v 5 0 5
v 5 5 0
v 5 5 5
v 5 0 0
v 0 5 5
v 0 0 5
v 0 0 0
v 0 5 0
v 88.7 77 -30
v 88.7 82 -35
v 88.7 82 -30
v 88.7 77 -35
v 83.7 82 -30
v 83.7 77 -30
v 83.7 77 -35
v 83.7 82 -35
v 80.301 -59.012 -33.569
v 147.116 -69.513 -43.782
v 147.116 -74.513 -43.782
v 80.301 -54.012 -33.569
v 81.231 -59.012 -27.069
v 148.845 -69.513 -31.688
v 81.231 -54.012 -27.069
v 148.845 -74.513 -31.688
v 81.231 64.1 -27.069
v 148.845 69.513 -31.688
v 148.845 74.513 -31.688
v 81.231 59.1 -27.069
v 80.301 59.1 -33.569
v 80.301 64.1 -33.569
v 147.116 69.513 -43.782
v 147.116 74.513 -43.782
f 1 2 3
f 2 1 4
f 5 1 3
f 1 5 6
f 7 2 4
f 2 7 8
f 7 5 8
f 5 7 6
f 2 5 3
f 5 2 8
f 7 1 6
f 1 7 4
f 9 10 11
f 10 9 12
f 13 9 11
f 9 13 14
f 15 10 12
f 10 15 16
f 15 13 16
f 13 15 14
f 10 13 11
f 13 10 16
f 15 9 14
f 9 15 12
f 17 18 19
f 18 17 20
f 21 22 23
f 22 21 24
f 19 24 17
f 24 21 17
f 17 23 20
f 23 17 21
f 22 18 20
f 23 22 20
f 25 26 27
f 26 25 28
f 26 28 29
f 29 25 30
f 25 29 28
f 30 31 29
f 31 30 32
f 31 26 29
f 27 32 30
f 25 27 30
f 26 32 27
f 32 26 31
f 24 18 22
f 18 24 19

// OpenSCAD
union() {
    cube(5);
    translate([ 88.7-5, 87-10, -34-1]) cube(5);
    polyhedron( points = [ 
            [153.898,59.513,-32.4658] , 
            [163.267,30.683,-34.429] , 
            [175.611,59.513,-24.8805] , 
            [184.981,30.683,-26.8437] , 
            [166.57,-1.77636e-15,-35.1211] , 
            [188.284,-1.77636e-15,-27.5359] , 
            [163.267,-30.683,-34.429] , 
            [184.981,-30.683,-26.8437] , 
            [153.898,-59.513,-32.4658] , 
            [175.611,-59.513,-24.8805] , 
            [181.898,59.513,-27.7158] , 
            [191.267,30.683,-29.679] , 
            [194.57,-1.77636e-15,-30.3711] , 
            [191.267,-30.683,-29.679] , 
            [181.898,-59.513,-27.7158] , 
            [163.961,59.513,-33.9819] , 
            [173.33,30.683,-35.9451] , 
            [176.633,-1.77636e-15,-36.6372] , 
            [173.33,-30.683,-35.9451] , 
            [163.961,-59.513,-33.9819] , 
            [148.845,69.513,-31.6884] , 
            [148.845,-69.513,-31.6884] , 
            [148.845,74.513,-31.6884] , 
            [148.845,-74.513,-31.6884] , 
            [162.25,59.513,-45.946] , 
            [162.25,-59.513,-45.946] , 
            [147.116,-74.513,-43.7824] , 
            [147.116,74.513,-43.7824] , 
            [80.3015,-54.0118,-33.5692] , 
            [147.116,-69.513,-43.7824] , 
            [80.3015,-59.0118,-33.5692] , 
            [81.2307,-54.0118,-27.0692] , 
            [81.2307,-59.0118,-27.0692] , 
            [2.52448,-36,-22.6917] , 
            [80.054,-54.0118,-33.5338] , 
            [80.054,-59.0118,-33.5338] , 
            [2.52448,-41,-22.6917] , 
            [80.9832,-59.0118,-27.0338] , 
            [80.9832,-54.0118,-27.0338] , 
            [2.666,-36,-21.7018] , 
            [2.666,-41,-21.7018] , 
            [147.116,69.513,-43.7824] , 
            [80.3015,59.0998,-33.5692] , 
            [80.3015,64.0998,-33.5692] , 
            [81.2307,59.0998,-27.0692] , 
            [81.2307,64.0998,-27.0692] , 
            [80.054,64.0998,-33.5338] , 
            [80.054,59.0998,-33.5338] , 
            [2.52448,47,-22.6917] , 
            [2.52448,52,-22.6917] , 
            [2.666,47,-21.7018] , 
            [80.9832,59.0998,-27.0338] , 
            [80.9832,64.0998,-27.0338] , 
            [2.666,52,-21.7018] , 
        ], 
        faces = [
            [2,1,0] , 
            [3,1,2] , 
            [3,4,1] , 
            [5,4,3] , 
            [5,6,4] , 
            [7,6,5] , 
            [7,8,6] , 
            [9,8,7] , 
            [10,3,2] , 
            [11,3,10] , 
            [11,5,3] , 
            [12,5,11] , 
            [12,7,5] , 
            [13,7,12] , 
            [13,9,7] , 
            [14,9,13] , 
            [15,11,10] , 
            [16,11,15] , 
            [16,12,11] , 
            [17,12,16] , 
            [17,13,12] , 
            [18,13,17] , 
            [18,14,13] , 
            [19,14,18] , 
            [20,0,1] , 
            [20,1,4] , 
            [20,4,21] , 
            [21,4,6] , 
            [21,6,8] , 
            [0,20,22] , 
            [23,21,8] , 
            [16,15,24] , 
            [17,16,24] , 
            [25,17,24] , 
            [18,17,25] , 
            [19,18,25] , 
            [26,25,24] , 
            [26,23,25] , 
            [23,19,25] , 
            [27,26,24] , 
            [24,15,22] , 
            [24,22,27] , 
            [23,27,22] , 
            [23,26,27] , 
            [0,15,10] , 
            [10,2,0] , 
            [22,15,0] , 
            [14,19,8] , 
            [8,9,14] , 
            [8,19,23] , 
        ]);
    translate([0,0,0]) polyhedron( points = [ 
            [153.898,59.513,-32.4658] , 
            [163.267,30.683,-34.429] , 
            [175.611,59.513,-24.8805] , 
            [184.981,30.683,-26.8437] , 
            [166.57,-1.77636e-15,-35.1211] , 
            [188.284,-1.77636e-15,-27.5359] , 
            [163.267,-30.683,-34.429] , 
            [184.981,-30.683,-26.8437] , 
            [153.898,-59.513,-32.4658] , 
            [175.611,-59.513,-24.8805] , 
            [181.898,59.513,-27.7158] , 
            [191.267,30.683,-29.679] , 
            [194.57,-1.77636e-15,-30.3711] , 
            [191.267,-30.683,-29.679] , 
            [181.898,-59.513,-27.7158] , 
            [163.961,59.513,-33.9819] , 
            [173.33,30.683,-35.9451] , 
            [176.633,-1.77636e-15,-36.6372] , 
            [173.33,-30.683,-35.9451] , 
            [163.961,-59.513,-33.9819] , 
            [148.845,69.513,-31.6884] , 
            [148.845,-69.513,-31.6884] , 
            [148.845,74.513,-31.6884] , 
            [148.845,-74.513,-31.6884] , 
            [162.25,59.513,-45.946] , 
            [162.25,-59.513,-45.946] , 
            [147.116,-74.513,-43.7824] , 
            [147.116,74.513,-43.7824] , 
            [80.3015,-54.0118,-33.5692] , 
            [147.116,-69.513,-43.7824] , 
            [80.3015,-59.0118,-33.5692] , 
            [81.2307,-54.0118,-27.0692] , 
            [81.2307,-59.0118,-27.0692] , 
            [2.52448,-36,-22.6917] , 
            [80.054,-54.0118,-33.5338] , 
            [80.054,-59.0118,-33.5338] , 
            [2.52448,-41,-22.6917] , 
            [80.9832,-59.0118,-27.0338] , 
            [80.9832,-54.0118,-27.0338] , 
            [2.666,-36,-21.7018] , 
            [2.666,-41,-21.7018] , 
            [147.116,69.513,-43.7824] , 
            [80.3015,59.0998,-33.5692] , 
            [80.3015,64.0998,-33.5692] , 
            [81.2307,59.0998,-27.0692] , 
            [81.2307,64.0998,-27.0692] , 
            [80.054,64.0998,-33.5338] , 
            [80.054,59.0998,-33.5338] , 
            [2.52448,47,-22.6917] , 
            [2.52448,52,-22.6917] , 
            [2.666,47,-21.7018] , 
            [80.9832,59.0998,-27.0338] , 
            [80.9832,64.0998,-27.0338] , 
            [2.666,52,-21.7018] , 
        ], 
        faces = [
            [26,29,28] , 
            [26,28,30] , 
            [31,21,23] , 
            [32,31,23] , 
            [23,26,30] , 
            [23,30,32] , 
            [28,32,30] , 
            [28,29,21] , 
            [31,28,21] , 
            [28,31,32] , 
            [22,20,44] , 
            [22,44,45] , 
            [20,42,44] , 
            [45,44,42] , 
            [43,45,42] , 
            [42,41,27] , 
            [43,42,27] , 
            [20,41,42] , 
            [43,27,22] , 
            [45,43,22] , 
            [41,22,27] , 
            [20,22,41] , 
            [26,23,29] ,
            [29,23,21] , 
        ]);
}
